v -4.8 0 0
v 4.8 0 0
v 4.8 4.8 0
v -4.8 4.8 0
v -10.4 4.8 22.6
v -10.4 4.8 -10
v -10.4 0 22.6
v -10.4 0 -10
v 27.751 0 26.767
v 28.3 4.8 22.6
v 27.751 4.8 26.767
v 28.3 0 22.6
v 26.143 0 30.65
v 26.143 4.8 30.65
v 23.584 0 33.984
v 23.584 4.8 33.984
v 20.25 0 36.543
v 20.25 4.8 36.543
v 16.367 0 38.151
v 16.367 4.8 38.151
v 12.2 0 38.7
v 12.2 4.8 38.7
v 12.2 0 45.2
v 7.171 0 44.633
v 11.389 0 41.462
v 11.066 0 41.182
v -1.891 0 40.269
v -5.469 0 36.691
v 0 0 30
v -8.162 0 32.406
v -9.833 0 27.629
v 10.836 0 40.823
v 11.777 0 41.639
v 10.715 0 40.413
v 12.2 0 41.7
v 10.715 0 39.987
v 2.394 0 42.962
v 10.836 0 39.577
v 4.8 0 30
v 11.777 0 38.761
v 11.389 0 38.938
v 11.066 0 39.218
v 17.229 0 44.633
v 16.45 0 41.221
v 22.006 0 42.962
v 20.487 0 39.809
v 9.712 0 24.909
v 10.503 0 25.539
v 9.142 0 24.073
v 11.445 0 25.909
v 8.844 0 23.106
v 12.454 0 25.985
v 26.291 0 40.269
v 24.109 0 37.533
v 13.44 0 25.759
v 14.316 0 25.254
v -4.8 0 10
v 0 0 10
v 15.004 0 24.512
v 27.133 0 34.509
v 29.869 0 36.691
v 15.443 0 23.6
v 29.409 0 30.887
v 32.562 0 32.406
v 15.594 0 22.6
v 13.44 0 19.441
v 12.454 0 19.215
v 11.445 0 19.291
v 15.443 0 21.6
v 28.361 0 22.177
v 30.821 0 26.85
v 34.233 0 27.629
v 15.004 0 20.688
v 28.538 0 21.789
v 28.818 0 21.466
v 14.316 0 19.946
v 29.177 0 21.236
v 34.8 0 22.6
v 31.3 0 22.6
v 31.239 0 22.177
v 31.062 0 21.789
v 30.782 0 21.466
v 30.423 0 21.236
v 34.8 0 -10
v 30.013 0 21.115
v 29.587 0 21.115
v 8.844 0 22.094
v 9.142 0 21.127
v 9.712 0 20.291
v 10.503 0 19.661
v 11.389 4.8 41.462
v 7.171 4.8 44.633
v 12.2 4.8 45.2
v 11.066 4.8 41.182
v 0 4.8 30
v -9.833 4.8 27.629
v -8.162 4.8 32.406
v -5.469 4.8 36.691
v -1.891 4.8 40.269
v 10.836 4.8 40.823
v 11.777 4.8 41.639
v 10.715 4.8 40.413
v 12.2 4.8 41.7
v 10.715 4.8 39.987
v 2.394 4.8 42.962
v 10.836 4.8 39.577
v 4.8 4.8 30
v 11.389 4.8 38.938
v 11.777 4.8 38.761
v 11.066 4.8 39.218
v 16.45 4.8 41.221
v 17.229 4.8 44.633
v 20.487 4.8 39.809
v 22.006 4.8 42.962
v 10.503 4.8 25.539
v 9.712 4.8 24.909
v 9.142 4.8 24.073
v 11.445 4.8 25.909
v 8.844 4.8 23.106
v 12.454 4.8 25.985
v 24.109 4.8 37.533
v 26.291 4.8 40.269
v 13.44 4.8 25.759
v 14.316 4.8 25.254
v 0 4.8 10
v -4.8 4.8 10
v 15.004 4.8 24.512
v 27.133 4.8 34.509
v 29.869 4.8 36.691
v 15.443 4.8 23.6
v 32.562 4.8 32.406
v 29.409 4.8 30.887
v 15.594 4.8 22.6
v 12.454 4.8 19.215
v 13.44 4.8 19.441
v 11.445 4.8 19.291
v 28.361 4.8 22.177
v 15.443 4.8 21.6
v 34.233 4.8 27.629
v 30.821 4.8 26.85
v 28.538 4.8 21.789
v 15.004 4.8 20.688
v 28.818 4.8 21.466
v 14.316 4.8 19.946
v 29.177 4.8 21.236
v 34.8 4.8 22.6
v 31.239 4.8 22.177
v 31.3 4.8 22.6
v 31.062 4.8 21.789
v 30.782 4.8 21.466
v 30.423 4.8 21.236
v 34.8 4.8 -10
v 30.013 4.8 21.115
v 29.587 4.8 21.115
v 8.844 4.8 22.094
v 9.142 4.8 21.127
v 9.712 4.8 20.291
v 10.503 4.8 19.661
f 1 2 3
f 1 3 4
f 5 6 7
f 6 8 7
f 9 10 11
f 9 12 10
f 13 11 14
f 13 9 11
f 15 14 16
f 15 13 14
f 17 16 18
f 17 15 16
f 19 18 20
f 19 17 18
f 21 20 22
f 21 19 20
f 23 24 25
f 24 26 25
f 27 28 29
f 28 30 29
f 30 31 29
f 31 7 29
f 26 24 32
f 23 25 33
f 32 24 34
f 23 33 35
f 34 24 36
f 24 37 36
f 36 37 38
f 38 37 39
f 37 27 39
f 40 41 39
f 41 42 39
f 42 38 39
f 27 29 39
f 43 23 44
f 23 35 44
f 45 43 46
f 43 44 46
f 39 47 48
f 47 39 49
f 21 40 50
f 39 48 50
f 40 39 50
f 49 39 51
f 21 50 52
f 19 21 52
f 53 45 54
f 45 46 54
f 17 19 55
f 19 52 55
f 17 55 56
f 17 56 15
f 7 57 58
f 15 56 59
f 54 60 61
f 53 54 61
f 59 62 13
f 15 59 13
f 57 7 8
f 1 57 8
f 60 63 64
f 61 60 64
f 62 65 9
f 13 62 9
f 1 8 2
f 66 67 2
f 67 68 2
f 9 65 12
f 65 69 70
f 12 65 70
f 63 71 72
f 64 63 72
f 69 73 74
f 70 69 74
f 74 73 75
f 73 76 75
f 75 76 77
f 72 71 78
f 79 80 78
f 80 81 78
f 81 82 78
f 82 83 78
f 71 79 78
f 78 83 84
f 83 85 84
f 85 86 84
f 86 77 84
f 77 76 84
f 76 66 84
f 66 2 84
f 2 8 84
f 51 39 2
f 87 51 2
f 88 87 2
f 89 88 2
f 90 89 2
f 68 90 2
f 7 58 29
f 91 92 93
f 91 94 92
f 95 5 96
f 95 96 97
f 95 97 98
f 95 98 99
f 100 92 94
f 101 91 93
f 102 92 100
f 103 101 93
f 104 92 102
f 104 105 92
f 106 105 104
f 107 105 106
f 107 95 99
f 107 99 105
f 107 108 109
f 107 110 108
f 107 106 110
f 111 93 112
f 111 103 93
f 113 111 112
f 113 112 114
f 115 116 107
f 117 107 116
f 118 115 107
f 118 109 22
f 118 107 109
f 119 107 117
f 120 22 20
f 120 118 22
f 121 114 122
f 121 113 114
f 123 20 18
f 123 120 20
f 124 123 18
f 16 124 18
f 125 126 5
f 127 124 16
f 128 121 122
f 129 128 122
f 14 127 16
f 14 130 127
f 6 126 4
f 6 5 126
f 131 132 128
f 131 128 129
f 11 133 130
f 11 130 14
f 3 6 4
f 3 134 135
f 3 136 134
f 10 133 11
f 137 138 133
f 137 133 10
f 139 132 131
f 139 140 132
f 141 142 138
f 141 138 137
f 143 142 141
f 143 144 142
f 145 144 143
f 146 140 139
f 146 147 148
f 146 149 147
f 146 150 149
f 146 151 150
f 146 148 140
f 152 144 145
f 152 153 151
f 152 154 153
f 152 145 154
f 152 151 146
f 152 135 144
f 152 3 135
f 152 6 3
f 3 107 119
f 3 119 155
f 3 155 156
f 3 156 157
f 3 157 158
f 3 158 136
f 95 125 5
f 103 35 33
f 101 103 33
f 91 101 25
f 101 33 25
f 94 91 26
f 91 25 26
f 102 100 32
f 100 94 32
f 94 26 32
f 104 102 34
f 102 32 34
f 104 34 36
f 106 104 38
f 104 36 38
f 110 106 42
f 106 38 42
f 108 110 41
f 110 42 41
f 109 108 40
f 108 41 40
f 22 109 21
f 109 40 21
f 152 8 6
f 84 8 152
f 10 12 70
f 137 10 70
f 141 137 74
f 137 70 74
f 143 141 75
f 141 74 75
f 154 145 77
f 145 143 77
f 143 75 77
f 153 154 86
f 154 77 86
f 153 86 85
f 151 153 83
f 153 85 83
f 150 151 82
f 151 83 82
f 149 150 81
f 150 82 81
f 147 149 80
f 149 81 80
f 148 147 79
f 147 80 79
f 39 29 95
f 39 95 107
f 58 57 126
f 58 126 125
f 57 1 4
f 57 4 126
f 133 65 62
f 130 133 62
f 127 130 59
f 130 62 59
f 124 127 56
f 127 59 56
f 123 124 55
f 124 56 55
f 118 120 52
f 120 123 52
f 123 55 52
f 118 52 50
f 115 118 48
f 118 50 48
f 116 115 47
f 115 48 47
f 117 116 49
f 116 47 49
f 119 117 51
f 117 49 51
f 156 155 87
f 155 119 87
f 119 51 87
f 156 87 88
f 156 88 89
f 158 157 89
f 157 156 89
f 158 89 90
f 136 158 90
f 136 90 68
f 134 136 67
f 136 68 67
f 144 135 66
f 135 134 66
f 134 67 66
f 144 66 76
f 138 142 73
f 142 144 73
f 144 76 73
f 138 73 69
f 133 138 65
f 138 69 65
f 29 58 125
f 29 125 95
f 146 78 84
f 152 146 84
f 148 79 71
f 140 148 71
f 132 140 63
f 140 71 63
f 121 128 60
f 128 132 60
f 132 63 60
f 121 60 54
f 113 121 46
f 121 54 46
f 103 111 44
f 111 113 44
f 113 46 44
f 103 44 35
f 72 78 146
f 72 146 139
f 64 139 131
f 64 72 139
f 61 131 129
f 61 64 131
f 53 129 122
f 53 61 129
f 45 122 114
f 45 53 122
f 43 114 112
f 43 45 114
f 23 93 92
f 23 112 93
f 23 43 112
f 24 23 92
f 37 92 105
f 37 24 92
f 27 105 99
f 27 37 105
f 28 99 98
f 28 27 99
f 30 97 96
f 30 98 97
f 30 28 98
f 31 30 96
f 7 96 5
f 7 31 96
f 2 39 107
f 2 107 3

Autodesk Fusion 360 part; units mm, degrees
sketch "Sketch1" plane through (0, 0, 0) normal (0, 1, 0) x (1, 0, 0)
  line L0 (0, 0) -> (-4.8, 0)
  line L1 (-4.8, 0) -> (-4.8, -10)
  line L2 (-4.8, -10) -> (0, -10)
  line L3 (0, -10) -> (0, -30)
  line L4 (0, -30) -> (4.8, -30)
  line L5 (4.8, -30) -> (4.8, 0)
  line L6 (4.8, 0) -> (0, 0)
  line L7 (0, 0) -> (0, -10) construction
  line L8 (-10.4, 10) -> (34.8, 10)
  line L9 (9.8, -25) -> (14.6, -25) construction
  line L10 (14.6, -25) -> (14.6, -20.2) construction
  line L11 (14.6, -20.2) -> (9.8, -20.2) construction
  line L12 (9.8, -20.2) -> (9.8, -25) construction
  line L13 (9.8, -22.6) -> (29.8, -22.6) construction
  line L14 (12.2, -20.2) -> (12.2, -40.2) construction
  circle A0 centre (12.2, -22.6) radius 3.3941
  arc A1 (31.3, -22.6) -> (12.2, -41.7) centre (12.2, -22.6) ccw construction
  arc A2 (12.2, -41.7) -> (31.3, -22.6) centre (12.2, -22.6) ccw
  arc A3 (28.3, -22.6) -> (12.2, -38.7) centre (12.2, -22.6) ccw construction
  arc A4 (12.2, -38.7) -> (28.3, -22.6) centre (12.2, -22.6) ccw
  arc A5 (12.2, -38.7) -> (12.2, -41.7) centre (12.2, -40.2) ccw
  arc A6 (12.2, -41.7) -> (12.2, -38.7) centre (12.2, -40.2) ccw construction
  arc A7 (31.3, -22.6) -> (28.3, -22.6) centre (29.8, -22.6) ccw
  arc A8 (28.3, -22.6) -> (31.3, -22.6) centre (29.8, -22.6) ccw construction
  circle A9 centre (12.2, -40.2) radius 5 construction
  line L15 (-10.4, 10) -> (-10.4, -22.6)
  arc A10 (12.2, -45.2) -> (12.2, -45.2) centre (12.2, -22.6) ccw
  line L16 (34.8, -22.6) -> (34.8, 10)
  line L17 (9.8, -25) -> (4.8, -25) construction
  arc A11 (34.8, -22.6) -> (-10.4, -22.6) centre (12.2, -22.6) ccw construction
  arc A12 (-10.4, -22.6) -> (12.2, -45.2) centre (12.2, -22.6) ccw
  arc A13 (12.2, -45.2) -> (34.8, -22.6) centre (12.2, -22.6) ccw
  point P0 (12.2, -20.2)
  point P1 (9.8, -22.6)
  point P2 (12.2, -22.6)
  dimension "d23" = 4.8
  dimension "d24" = 10
  dimension "d26" = 4.8
  dimension "d27" = 10
  dimension "d31" = 4.8
  dimension "d32" = 4.8
  dimension "d33" = 20
  dimension "d34" = 20
  dimension "d35" = 3
  dimension "d36" = 3
  dimension "d37" = 10
  dimension "d38" = 30
  dimension "d40" = 5
  dimension "d41" = 5
extrude "Extrude1" add sketch "Sketch1" along normal blind 4.8 contours L0 L1 L5 L6 L8 L15 A10 L16 | L1 L2 L3 L4 L5 A10 A12 A13
